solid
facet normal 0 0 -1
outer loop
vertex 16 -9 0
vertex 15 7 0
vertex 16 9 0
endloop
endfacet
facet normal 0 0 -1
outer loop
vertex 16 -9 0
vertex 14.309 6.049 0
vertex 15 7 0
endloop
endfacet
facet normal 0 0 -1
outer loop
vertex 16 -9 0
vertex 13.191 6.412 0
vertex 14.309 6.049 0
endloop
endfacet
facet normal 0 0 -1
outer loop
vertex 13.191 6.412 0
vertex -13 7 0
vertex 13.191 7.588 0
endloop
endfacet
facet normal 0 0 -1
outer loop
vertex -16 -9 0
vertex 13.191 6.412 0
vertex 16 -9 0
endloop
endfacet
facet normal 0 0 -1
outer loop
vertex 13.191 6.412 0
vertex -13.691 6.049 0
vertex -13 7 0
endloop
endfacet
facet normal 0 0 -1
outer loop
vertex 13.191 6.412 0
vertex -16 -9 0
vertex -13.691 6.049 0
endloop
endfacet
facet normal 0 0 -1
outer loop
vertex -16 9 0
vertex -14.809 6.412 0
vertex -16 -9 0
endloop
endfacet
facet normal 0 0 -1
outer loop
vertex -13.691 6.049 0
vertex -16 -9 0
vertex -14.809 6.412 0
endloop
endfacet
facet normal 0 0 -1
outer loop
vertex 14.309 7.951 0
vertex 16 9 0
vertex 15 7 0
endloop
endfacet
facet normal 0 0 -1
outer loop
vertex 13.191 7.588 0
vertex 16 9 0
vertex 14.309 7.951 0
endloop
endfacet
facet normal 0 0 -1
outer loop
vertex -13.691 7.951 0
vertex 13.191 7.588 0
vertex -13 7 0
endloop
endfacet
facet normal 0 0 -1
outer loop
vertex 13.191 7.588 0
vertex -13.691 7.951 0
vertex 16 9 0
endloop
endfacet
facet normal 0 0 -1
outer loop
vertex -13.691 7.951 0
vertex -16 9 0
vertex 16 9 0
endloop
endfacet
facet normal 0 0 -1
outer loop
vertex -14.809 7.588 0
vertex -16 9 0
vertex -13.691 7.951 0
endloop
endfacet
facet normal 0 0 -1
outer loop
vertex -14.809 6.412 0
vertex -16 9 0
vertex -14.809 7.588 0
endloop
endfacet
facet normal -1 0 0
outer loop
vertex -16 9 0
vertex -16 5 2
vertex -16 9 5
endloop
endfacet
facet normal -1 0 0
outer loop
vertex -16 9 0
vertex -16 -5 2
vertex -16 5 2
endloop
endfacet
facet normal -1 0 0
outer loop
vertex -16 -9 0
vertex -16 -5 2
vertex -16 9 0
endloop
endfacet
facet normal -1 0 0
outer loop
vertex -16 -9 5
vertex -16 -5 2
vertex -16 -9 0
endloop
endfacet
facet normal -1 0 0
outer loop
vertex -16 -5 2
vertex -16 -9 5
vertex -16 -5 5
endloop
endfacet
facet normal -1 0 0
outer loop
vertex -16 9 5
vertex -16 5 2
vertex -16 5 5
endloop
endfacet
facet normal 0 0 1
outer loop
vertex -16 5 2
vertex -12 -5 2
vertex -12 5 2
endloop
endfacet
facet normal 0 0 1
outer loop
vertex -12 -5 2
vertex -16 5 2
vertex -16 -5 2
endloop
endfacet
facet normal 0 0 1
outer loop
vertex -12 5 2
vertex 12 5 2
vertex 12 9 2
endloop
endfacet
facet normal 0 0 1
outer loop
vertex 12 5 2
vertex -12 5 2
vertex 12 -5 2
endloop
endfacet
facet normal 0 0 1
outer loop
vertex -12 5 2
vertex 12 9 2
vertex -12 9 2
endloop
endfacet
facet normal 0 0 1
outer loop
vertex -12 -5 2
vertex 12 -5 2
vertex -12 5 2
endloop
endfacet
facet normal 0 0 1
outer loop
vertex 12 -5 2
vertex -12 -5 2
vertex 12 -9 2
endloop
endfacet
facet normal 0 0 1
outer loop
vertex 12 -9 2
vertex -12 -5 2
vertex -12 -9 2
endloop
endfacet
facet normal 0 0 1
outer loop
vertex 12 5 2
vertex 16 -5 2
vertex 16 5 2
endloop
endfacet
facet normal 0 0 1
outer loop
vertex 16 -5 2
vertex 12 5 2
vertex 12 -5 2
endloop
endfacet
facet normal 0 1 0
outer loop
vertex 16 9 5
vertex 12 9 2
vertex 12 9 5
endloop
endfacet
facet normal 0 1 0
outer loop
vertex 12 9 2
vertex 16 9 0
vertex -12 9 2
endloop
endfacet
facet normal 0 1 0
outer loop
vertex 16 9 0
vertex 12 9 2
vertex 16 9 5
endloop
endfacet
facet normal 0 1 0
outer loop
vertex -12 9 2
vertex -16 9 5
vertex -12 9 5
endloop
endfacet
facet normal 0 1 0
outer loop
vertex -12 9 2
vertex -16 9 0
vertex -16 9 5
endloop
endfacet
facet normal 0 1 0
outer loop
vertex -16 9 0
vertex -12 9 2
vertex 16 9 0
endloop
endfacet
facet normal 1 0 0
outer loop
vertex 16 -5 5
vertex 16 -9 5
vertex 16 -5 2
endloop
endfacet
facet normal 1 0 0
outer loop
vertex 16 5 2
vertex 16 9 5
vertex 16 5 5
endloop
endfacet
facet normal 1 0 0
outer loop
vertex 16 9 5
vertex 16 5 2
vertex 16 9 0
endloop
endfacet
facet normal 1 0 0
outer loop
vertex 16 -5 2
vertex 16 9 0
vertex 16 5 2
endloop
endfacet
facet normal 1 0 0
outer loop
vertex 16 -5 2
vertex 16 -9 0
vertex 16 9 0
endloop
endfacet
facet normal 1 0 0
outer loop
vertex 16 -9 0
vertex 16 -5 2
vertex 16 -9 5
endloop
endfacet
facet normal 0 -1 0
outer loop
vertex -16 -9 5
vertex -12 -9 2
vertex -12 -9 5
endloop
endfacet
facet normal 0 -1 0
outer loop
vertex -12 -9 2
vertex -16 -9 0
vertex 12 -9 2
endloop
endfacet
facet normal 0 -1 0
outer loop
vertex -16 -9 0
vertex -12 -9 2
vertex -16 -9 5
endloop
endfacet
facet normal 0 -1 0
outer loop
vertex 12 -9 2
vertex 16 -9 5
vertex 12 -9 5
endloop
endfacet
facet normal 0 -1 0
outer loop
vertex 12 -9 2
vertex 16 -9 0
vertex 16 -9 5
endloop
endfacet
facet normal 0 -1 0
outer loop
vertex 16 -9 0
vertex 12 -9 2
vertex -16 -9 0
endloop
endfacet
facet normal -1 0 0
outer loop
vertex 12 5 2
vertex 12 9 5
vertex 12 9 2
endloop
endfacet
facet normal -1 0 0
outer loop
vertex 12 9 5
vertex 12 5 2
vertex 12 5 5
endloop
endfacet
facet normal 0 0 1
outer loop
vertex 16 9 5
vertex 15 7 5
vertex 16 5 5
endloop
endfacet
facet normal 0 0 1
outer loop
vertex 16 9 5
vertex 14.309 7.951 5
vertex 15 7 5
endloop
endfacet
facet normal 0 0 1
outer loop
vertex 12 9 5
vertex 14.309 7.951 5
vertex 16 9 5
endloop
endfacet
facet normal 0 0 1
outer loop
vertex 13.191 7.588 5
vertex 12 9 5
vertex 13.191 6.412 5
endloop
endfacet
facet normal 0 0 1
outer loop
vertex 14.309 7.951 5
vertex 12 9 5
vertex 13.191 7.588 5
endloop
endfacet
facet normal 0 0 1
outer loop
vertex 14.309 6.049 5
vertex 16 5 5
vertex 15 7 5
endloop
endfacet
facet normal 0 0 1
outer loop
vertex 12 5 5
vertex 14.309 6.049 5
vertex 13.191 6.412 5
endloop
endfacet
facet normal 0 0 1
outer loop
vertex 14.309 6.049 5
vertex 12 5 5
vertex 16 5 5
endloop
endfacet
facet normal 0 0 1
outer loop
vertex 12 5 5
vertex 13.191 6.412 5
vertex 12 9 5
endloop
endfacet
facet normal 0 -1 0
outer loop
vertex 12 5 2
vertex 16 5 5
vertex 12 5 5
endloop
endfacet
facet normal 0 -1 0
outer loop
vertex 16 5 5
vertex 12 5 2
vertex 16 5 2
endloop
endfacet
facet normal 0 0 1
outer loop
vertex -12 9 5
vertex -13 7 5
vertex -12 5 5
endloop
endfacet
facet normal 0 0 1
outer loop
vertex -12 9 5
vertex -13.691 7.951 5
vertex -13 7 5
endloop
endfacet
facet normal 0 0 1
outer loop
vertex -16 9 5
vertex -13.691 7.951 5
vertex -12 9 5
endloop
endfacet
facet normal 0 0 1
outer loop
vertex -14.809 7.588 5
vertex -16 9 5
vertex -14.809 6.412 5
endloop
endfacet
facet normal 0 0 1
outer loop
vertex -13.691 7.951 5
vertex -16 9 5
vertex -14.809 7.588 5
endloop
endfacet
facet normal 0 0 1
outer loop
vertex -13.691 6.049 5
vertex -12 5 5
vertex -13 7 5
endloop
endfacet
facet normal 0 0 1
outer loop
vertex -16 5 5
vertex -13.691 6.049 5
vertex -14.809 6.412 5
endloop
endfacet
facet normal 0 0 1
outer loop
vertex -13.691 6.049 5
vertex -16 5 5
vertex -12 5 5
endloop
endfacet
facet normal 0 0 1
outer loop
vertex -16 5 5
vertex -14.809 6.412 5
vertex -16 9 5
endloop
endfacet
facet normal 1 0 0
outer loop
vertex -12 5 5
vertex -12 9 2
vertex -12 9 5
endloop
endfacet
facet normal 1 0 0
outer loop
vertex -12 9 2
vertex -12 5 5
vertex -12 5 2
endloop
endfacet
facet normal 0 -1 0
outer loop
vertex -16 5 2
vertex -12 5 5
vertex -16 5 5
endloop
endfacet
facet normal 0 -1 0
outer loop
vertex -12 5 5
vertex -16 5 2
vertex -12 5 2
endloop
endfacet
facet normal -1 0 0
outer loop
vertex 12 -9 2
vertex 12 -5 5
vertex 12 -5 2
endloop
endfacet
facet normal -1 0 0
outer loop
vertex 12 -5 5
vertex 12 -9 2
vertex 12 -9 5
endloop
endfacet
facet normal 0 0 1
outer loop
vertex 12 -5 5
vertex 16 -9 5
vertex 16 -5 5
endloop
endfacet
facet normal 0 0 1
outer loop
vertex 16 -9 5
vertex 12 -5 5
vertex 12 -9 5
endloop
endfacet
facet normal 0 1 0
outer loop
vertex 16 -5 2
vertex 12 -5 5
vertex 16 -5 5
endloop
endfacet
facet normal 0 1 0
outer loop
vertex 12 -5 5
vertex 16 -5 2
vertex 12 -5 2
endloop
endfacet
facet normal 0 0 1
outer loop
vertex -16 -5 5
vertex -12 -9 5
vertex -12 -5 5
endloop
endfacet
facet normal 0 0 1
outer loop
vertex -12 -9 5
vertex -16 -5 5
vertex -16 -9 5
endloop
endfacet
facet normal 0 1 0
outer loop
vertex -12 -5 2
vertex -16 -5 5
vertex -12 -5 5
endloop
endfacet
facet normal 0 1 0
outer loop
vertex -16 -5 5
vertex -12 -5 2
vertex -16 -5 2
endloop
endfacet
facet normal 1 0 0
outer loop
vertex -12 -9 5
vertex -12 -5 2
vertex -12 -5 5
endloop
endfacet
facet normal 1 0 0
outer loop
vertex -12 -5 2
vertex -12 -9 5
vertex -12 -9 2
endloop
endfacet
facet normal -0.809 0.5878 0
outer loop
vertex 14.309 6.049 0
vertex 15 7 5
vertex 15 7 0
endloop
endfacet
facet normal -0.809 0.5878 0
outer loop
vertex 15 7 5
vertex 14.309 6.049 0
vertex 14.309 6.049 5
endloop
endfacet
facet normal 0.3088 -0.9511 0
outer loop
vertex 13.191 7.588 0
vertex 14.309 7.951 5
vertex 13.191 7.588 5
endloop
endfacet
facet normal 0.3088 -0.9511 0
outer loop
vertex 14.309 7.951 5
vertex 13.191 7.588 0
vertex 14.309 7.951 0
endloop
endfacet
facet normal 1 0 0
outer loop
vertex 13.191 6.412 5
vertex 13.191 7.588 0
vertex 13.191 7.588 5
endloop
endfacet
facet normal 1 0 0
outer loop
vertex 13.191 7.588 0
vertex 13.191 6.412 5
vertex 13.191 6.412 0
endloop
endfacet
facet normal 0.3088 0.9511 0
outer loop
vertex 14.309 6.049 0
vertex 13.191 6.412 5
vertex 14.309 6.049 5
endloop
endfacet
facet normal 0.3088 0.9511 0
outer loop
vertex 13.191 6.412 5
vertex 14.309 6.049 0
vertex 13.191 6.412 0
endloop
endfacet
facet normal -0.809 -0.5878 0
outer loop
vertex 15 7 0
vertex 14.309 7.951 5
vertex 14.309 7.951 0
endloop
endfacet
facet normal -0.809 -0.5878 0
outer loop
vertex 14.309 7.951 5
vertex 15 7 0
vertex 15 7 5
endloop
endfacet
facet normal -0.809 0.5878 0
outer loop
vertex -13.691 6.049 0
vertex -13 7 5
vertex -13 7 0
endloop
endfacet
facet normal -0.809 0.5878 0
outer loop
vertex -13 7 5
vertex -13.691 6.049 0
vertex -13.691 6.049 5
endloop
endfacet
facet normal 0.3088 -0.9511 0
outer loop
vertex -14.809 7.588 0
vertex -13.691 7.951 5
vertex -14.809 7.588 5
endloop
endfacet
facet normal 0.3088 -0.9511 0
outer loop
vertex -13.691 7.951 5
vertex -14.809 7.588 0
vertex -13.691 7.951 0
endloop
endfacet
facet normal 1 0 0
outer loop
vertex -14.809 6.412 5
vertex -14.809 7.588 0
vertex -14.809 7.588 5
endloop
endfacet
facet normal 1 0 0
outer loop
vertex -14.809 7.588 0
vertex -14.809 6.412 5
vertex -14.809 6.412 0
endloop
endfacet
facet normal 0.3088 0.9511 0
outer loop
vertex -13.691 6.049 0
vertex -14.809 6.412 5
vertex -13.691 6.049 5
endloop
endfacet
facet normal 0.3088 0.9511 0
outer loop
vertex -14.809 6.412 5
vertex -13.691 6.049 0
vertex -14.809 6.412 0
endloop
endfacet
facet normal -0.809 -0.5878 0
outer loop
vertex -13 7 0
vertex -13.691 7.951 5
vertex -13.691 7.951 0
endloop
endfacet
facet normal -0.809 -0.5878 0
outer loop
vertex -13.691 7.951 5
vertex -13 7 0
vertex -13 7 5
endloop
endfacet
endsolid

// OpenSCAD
// OV9281 mounting board
// (c) 2026 Bernd Porr

// width of the board
w = 32;

// height of the board
h = 18;

// thickness of the board
thickness = 2;

// x coord of the drillhole
xhole = 14.0;

// y coord of the drillhole
yhole = 7;

// diameter of the drillhole
drilldiam = 2;

// diameter of the post
postdiam = 4;

// height of the post
postheight = 3;

color("grey")
difference() {
    union() {
        linear_extrude(height = thickness)
        square([w, h], center = true);
        translate([xhole,yhole,0])
        linear_extrude(height = postheight + thickness)
        square(postdiam,true);    
        translate([-xhole,yhole,0])
        linear_extrude(height = postheight + thickness)
        square(postdiam,true);    
        translate([xhole,-yhole,0])
        linear_extrude(height = postheight + thickness)
        square(postdiam,true);    
        translate([-xhole,-yhole,0])
        linear_extrude(height = postheight + thickness)
        square(postdiam,true);    
    }

    // drillholes
    translate([xhole,yhole,-1])
    linear_extrude(height = postheight + thickness + 2)
    circle(d=drilldiam);

    translate([-xhole,yhole,-1])
    linear_extrude(height = postheight + thickness + 2)
    circle(d=drilldiam);

}
